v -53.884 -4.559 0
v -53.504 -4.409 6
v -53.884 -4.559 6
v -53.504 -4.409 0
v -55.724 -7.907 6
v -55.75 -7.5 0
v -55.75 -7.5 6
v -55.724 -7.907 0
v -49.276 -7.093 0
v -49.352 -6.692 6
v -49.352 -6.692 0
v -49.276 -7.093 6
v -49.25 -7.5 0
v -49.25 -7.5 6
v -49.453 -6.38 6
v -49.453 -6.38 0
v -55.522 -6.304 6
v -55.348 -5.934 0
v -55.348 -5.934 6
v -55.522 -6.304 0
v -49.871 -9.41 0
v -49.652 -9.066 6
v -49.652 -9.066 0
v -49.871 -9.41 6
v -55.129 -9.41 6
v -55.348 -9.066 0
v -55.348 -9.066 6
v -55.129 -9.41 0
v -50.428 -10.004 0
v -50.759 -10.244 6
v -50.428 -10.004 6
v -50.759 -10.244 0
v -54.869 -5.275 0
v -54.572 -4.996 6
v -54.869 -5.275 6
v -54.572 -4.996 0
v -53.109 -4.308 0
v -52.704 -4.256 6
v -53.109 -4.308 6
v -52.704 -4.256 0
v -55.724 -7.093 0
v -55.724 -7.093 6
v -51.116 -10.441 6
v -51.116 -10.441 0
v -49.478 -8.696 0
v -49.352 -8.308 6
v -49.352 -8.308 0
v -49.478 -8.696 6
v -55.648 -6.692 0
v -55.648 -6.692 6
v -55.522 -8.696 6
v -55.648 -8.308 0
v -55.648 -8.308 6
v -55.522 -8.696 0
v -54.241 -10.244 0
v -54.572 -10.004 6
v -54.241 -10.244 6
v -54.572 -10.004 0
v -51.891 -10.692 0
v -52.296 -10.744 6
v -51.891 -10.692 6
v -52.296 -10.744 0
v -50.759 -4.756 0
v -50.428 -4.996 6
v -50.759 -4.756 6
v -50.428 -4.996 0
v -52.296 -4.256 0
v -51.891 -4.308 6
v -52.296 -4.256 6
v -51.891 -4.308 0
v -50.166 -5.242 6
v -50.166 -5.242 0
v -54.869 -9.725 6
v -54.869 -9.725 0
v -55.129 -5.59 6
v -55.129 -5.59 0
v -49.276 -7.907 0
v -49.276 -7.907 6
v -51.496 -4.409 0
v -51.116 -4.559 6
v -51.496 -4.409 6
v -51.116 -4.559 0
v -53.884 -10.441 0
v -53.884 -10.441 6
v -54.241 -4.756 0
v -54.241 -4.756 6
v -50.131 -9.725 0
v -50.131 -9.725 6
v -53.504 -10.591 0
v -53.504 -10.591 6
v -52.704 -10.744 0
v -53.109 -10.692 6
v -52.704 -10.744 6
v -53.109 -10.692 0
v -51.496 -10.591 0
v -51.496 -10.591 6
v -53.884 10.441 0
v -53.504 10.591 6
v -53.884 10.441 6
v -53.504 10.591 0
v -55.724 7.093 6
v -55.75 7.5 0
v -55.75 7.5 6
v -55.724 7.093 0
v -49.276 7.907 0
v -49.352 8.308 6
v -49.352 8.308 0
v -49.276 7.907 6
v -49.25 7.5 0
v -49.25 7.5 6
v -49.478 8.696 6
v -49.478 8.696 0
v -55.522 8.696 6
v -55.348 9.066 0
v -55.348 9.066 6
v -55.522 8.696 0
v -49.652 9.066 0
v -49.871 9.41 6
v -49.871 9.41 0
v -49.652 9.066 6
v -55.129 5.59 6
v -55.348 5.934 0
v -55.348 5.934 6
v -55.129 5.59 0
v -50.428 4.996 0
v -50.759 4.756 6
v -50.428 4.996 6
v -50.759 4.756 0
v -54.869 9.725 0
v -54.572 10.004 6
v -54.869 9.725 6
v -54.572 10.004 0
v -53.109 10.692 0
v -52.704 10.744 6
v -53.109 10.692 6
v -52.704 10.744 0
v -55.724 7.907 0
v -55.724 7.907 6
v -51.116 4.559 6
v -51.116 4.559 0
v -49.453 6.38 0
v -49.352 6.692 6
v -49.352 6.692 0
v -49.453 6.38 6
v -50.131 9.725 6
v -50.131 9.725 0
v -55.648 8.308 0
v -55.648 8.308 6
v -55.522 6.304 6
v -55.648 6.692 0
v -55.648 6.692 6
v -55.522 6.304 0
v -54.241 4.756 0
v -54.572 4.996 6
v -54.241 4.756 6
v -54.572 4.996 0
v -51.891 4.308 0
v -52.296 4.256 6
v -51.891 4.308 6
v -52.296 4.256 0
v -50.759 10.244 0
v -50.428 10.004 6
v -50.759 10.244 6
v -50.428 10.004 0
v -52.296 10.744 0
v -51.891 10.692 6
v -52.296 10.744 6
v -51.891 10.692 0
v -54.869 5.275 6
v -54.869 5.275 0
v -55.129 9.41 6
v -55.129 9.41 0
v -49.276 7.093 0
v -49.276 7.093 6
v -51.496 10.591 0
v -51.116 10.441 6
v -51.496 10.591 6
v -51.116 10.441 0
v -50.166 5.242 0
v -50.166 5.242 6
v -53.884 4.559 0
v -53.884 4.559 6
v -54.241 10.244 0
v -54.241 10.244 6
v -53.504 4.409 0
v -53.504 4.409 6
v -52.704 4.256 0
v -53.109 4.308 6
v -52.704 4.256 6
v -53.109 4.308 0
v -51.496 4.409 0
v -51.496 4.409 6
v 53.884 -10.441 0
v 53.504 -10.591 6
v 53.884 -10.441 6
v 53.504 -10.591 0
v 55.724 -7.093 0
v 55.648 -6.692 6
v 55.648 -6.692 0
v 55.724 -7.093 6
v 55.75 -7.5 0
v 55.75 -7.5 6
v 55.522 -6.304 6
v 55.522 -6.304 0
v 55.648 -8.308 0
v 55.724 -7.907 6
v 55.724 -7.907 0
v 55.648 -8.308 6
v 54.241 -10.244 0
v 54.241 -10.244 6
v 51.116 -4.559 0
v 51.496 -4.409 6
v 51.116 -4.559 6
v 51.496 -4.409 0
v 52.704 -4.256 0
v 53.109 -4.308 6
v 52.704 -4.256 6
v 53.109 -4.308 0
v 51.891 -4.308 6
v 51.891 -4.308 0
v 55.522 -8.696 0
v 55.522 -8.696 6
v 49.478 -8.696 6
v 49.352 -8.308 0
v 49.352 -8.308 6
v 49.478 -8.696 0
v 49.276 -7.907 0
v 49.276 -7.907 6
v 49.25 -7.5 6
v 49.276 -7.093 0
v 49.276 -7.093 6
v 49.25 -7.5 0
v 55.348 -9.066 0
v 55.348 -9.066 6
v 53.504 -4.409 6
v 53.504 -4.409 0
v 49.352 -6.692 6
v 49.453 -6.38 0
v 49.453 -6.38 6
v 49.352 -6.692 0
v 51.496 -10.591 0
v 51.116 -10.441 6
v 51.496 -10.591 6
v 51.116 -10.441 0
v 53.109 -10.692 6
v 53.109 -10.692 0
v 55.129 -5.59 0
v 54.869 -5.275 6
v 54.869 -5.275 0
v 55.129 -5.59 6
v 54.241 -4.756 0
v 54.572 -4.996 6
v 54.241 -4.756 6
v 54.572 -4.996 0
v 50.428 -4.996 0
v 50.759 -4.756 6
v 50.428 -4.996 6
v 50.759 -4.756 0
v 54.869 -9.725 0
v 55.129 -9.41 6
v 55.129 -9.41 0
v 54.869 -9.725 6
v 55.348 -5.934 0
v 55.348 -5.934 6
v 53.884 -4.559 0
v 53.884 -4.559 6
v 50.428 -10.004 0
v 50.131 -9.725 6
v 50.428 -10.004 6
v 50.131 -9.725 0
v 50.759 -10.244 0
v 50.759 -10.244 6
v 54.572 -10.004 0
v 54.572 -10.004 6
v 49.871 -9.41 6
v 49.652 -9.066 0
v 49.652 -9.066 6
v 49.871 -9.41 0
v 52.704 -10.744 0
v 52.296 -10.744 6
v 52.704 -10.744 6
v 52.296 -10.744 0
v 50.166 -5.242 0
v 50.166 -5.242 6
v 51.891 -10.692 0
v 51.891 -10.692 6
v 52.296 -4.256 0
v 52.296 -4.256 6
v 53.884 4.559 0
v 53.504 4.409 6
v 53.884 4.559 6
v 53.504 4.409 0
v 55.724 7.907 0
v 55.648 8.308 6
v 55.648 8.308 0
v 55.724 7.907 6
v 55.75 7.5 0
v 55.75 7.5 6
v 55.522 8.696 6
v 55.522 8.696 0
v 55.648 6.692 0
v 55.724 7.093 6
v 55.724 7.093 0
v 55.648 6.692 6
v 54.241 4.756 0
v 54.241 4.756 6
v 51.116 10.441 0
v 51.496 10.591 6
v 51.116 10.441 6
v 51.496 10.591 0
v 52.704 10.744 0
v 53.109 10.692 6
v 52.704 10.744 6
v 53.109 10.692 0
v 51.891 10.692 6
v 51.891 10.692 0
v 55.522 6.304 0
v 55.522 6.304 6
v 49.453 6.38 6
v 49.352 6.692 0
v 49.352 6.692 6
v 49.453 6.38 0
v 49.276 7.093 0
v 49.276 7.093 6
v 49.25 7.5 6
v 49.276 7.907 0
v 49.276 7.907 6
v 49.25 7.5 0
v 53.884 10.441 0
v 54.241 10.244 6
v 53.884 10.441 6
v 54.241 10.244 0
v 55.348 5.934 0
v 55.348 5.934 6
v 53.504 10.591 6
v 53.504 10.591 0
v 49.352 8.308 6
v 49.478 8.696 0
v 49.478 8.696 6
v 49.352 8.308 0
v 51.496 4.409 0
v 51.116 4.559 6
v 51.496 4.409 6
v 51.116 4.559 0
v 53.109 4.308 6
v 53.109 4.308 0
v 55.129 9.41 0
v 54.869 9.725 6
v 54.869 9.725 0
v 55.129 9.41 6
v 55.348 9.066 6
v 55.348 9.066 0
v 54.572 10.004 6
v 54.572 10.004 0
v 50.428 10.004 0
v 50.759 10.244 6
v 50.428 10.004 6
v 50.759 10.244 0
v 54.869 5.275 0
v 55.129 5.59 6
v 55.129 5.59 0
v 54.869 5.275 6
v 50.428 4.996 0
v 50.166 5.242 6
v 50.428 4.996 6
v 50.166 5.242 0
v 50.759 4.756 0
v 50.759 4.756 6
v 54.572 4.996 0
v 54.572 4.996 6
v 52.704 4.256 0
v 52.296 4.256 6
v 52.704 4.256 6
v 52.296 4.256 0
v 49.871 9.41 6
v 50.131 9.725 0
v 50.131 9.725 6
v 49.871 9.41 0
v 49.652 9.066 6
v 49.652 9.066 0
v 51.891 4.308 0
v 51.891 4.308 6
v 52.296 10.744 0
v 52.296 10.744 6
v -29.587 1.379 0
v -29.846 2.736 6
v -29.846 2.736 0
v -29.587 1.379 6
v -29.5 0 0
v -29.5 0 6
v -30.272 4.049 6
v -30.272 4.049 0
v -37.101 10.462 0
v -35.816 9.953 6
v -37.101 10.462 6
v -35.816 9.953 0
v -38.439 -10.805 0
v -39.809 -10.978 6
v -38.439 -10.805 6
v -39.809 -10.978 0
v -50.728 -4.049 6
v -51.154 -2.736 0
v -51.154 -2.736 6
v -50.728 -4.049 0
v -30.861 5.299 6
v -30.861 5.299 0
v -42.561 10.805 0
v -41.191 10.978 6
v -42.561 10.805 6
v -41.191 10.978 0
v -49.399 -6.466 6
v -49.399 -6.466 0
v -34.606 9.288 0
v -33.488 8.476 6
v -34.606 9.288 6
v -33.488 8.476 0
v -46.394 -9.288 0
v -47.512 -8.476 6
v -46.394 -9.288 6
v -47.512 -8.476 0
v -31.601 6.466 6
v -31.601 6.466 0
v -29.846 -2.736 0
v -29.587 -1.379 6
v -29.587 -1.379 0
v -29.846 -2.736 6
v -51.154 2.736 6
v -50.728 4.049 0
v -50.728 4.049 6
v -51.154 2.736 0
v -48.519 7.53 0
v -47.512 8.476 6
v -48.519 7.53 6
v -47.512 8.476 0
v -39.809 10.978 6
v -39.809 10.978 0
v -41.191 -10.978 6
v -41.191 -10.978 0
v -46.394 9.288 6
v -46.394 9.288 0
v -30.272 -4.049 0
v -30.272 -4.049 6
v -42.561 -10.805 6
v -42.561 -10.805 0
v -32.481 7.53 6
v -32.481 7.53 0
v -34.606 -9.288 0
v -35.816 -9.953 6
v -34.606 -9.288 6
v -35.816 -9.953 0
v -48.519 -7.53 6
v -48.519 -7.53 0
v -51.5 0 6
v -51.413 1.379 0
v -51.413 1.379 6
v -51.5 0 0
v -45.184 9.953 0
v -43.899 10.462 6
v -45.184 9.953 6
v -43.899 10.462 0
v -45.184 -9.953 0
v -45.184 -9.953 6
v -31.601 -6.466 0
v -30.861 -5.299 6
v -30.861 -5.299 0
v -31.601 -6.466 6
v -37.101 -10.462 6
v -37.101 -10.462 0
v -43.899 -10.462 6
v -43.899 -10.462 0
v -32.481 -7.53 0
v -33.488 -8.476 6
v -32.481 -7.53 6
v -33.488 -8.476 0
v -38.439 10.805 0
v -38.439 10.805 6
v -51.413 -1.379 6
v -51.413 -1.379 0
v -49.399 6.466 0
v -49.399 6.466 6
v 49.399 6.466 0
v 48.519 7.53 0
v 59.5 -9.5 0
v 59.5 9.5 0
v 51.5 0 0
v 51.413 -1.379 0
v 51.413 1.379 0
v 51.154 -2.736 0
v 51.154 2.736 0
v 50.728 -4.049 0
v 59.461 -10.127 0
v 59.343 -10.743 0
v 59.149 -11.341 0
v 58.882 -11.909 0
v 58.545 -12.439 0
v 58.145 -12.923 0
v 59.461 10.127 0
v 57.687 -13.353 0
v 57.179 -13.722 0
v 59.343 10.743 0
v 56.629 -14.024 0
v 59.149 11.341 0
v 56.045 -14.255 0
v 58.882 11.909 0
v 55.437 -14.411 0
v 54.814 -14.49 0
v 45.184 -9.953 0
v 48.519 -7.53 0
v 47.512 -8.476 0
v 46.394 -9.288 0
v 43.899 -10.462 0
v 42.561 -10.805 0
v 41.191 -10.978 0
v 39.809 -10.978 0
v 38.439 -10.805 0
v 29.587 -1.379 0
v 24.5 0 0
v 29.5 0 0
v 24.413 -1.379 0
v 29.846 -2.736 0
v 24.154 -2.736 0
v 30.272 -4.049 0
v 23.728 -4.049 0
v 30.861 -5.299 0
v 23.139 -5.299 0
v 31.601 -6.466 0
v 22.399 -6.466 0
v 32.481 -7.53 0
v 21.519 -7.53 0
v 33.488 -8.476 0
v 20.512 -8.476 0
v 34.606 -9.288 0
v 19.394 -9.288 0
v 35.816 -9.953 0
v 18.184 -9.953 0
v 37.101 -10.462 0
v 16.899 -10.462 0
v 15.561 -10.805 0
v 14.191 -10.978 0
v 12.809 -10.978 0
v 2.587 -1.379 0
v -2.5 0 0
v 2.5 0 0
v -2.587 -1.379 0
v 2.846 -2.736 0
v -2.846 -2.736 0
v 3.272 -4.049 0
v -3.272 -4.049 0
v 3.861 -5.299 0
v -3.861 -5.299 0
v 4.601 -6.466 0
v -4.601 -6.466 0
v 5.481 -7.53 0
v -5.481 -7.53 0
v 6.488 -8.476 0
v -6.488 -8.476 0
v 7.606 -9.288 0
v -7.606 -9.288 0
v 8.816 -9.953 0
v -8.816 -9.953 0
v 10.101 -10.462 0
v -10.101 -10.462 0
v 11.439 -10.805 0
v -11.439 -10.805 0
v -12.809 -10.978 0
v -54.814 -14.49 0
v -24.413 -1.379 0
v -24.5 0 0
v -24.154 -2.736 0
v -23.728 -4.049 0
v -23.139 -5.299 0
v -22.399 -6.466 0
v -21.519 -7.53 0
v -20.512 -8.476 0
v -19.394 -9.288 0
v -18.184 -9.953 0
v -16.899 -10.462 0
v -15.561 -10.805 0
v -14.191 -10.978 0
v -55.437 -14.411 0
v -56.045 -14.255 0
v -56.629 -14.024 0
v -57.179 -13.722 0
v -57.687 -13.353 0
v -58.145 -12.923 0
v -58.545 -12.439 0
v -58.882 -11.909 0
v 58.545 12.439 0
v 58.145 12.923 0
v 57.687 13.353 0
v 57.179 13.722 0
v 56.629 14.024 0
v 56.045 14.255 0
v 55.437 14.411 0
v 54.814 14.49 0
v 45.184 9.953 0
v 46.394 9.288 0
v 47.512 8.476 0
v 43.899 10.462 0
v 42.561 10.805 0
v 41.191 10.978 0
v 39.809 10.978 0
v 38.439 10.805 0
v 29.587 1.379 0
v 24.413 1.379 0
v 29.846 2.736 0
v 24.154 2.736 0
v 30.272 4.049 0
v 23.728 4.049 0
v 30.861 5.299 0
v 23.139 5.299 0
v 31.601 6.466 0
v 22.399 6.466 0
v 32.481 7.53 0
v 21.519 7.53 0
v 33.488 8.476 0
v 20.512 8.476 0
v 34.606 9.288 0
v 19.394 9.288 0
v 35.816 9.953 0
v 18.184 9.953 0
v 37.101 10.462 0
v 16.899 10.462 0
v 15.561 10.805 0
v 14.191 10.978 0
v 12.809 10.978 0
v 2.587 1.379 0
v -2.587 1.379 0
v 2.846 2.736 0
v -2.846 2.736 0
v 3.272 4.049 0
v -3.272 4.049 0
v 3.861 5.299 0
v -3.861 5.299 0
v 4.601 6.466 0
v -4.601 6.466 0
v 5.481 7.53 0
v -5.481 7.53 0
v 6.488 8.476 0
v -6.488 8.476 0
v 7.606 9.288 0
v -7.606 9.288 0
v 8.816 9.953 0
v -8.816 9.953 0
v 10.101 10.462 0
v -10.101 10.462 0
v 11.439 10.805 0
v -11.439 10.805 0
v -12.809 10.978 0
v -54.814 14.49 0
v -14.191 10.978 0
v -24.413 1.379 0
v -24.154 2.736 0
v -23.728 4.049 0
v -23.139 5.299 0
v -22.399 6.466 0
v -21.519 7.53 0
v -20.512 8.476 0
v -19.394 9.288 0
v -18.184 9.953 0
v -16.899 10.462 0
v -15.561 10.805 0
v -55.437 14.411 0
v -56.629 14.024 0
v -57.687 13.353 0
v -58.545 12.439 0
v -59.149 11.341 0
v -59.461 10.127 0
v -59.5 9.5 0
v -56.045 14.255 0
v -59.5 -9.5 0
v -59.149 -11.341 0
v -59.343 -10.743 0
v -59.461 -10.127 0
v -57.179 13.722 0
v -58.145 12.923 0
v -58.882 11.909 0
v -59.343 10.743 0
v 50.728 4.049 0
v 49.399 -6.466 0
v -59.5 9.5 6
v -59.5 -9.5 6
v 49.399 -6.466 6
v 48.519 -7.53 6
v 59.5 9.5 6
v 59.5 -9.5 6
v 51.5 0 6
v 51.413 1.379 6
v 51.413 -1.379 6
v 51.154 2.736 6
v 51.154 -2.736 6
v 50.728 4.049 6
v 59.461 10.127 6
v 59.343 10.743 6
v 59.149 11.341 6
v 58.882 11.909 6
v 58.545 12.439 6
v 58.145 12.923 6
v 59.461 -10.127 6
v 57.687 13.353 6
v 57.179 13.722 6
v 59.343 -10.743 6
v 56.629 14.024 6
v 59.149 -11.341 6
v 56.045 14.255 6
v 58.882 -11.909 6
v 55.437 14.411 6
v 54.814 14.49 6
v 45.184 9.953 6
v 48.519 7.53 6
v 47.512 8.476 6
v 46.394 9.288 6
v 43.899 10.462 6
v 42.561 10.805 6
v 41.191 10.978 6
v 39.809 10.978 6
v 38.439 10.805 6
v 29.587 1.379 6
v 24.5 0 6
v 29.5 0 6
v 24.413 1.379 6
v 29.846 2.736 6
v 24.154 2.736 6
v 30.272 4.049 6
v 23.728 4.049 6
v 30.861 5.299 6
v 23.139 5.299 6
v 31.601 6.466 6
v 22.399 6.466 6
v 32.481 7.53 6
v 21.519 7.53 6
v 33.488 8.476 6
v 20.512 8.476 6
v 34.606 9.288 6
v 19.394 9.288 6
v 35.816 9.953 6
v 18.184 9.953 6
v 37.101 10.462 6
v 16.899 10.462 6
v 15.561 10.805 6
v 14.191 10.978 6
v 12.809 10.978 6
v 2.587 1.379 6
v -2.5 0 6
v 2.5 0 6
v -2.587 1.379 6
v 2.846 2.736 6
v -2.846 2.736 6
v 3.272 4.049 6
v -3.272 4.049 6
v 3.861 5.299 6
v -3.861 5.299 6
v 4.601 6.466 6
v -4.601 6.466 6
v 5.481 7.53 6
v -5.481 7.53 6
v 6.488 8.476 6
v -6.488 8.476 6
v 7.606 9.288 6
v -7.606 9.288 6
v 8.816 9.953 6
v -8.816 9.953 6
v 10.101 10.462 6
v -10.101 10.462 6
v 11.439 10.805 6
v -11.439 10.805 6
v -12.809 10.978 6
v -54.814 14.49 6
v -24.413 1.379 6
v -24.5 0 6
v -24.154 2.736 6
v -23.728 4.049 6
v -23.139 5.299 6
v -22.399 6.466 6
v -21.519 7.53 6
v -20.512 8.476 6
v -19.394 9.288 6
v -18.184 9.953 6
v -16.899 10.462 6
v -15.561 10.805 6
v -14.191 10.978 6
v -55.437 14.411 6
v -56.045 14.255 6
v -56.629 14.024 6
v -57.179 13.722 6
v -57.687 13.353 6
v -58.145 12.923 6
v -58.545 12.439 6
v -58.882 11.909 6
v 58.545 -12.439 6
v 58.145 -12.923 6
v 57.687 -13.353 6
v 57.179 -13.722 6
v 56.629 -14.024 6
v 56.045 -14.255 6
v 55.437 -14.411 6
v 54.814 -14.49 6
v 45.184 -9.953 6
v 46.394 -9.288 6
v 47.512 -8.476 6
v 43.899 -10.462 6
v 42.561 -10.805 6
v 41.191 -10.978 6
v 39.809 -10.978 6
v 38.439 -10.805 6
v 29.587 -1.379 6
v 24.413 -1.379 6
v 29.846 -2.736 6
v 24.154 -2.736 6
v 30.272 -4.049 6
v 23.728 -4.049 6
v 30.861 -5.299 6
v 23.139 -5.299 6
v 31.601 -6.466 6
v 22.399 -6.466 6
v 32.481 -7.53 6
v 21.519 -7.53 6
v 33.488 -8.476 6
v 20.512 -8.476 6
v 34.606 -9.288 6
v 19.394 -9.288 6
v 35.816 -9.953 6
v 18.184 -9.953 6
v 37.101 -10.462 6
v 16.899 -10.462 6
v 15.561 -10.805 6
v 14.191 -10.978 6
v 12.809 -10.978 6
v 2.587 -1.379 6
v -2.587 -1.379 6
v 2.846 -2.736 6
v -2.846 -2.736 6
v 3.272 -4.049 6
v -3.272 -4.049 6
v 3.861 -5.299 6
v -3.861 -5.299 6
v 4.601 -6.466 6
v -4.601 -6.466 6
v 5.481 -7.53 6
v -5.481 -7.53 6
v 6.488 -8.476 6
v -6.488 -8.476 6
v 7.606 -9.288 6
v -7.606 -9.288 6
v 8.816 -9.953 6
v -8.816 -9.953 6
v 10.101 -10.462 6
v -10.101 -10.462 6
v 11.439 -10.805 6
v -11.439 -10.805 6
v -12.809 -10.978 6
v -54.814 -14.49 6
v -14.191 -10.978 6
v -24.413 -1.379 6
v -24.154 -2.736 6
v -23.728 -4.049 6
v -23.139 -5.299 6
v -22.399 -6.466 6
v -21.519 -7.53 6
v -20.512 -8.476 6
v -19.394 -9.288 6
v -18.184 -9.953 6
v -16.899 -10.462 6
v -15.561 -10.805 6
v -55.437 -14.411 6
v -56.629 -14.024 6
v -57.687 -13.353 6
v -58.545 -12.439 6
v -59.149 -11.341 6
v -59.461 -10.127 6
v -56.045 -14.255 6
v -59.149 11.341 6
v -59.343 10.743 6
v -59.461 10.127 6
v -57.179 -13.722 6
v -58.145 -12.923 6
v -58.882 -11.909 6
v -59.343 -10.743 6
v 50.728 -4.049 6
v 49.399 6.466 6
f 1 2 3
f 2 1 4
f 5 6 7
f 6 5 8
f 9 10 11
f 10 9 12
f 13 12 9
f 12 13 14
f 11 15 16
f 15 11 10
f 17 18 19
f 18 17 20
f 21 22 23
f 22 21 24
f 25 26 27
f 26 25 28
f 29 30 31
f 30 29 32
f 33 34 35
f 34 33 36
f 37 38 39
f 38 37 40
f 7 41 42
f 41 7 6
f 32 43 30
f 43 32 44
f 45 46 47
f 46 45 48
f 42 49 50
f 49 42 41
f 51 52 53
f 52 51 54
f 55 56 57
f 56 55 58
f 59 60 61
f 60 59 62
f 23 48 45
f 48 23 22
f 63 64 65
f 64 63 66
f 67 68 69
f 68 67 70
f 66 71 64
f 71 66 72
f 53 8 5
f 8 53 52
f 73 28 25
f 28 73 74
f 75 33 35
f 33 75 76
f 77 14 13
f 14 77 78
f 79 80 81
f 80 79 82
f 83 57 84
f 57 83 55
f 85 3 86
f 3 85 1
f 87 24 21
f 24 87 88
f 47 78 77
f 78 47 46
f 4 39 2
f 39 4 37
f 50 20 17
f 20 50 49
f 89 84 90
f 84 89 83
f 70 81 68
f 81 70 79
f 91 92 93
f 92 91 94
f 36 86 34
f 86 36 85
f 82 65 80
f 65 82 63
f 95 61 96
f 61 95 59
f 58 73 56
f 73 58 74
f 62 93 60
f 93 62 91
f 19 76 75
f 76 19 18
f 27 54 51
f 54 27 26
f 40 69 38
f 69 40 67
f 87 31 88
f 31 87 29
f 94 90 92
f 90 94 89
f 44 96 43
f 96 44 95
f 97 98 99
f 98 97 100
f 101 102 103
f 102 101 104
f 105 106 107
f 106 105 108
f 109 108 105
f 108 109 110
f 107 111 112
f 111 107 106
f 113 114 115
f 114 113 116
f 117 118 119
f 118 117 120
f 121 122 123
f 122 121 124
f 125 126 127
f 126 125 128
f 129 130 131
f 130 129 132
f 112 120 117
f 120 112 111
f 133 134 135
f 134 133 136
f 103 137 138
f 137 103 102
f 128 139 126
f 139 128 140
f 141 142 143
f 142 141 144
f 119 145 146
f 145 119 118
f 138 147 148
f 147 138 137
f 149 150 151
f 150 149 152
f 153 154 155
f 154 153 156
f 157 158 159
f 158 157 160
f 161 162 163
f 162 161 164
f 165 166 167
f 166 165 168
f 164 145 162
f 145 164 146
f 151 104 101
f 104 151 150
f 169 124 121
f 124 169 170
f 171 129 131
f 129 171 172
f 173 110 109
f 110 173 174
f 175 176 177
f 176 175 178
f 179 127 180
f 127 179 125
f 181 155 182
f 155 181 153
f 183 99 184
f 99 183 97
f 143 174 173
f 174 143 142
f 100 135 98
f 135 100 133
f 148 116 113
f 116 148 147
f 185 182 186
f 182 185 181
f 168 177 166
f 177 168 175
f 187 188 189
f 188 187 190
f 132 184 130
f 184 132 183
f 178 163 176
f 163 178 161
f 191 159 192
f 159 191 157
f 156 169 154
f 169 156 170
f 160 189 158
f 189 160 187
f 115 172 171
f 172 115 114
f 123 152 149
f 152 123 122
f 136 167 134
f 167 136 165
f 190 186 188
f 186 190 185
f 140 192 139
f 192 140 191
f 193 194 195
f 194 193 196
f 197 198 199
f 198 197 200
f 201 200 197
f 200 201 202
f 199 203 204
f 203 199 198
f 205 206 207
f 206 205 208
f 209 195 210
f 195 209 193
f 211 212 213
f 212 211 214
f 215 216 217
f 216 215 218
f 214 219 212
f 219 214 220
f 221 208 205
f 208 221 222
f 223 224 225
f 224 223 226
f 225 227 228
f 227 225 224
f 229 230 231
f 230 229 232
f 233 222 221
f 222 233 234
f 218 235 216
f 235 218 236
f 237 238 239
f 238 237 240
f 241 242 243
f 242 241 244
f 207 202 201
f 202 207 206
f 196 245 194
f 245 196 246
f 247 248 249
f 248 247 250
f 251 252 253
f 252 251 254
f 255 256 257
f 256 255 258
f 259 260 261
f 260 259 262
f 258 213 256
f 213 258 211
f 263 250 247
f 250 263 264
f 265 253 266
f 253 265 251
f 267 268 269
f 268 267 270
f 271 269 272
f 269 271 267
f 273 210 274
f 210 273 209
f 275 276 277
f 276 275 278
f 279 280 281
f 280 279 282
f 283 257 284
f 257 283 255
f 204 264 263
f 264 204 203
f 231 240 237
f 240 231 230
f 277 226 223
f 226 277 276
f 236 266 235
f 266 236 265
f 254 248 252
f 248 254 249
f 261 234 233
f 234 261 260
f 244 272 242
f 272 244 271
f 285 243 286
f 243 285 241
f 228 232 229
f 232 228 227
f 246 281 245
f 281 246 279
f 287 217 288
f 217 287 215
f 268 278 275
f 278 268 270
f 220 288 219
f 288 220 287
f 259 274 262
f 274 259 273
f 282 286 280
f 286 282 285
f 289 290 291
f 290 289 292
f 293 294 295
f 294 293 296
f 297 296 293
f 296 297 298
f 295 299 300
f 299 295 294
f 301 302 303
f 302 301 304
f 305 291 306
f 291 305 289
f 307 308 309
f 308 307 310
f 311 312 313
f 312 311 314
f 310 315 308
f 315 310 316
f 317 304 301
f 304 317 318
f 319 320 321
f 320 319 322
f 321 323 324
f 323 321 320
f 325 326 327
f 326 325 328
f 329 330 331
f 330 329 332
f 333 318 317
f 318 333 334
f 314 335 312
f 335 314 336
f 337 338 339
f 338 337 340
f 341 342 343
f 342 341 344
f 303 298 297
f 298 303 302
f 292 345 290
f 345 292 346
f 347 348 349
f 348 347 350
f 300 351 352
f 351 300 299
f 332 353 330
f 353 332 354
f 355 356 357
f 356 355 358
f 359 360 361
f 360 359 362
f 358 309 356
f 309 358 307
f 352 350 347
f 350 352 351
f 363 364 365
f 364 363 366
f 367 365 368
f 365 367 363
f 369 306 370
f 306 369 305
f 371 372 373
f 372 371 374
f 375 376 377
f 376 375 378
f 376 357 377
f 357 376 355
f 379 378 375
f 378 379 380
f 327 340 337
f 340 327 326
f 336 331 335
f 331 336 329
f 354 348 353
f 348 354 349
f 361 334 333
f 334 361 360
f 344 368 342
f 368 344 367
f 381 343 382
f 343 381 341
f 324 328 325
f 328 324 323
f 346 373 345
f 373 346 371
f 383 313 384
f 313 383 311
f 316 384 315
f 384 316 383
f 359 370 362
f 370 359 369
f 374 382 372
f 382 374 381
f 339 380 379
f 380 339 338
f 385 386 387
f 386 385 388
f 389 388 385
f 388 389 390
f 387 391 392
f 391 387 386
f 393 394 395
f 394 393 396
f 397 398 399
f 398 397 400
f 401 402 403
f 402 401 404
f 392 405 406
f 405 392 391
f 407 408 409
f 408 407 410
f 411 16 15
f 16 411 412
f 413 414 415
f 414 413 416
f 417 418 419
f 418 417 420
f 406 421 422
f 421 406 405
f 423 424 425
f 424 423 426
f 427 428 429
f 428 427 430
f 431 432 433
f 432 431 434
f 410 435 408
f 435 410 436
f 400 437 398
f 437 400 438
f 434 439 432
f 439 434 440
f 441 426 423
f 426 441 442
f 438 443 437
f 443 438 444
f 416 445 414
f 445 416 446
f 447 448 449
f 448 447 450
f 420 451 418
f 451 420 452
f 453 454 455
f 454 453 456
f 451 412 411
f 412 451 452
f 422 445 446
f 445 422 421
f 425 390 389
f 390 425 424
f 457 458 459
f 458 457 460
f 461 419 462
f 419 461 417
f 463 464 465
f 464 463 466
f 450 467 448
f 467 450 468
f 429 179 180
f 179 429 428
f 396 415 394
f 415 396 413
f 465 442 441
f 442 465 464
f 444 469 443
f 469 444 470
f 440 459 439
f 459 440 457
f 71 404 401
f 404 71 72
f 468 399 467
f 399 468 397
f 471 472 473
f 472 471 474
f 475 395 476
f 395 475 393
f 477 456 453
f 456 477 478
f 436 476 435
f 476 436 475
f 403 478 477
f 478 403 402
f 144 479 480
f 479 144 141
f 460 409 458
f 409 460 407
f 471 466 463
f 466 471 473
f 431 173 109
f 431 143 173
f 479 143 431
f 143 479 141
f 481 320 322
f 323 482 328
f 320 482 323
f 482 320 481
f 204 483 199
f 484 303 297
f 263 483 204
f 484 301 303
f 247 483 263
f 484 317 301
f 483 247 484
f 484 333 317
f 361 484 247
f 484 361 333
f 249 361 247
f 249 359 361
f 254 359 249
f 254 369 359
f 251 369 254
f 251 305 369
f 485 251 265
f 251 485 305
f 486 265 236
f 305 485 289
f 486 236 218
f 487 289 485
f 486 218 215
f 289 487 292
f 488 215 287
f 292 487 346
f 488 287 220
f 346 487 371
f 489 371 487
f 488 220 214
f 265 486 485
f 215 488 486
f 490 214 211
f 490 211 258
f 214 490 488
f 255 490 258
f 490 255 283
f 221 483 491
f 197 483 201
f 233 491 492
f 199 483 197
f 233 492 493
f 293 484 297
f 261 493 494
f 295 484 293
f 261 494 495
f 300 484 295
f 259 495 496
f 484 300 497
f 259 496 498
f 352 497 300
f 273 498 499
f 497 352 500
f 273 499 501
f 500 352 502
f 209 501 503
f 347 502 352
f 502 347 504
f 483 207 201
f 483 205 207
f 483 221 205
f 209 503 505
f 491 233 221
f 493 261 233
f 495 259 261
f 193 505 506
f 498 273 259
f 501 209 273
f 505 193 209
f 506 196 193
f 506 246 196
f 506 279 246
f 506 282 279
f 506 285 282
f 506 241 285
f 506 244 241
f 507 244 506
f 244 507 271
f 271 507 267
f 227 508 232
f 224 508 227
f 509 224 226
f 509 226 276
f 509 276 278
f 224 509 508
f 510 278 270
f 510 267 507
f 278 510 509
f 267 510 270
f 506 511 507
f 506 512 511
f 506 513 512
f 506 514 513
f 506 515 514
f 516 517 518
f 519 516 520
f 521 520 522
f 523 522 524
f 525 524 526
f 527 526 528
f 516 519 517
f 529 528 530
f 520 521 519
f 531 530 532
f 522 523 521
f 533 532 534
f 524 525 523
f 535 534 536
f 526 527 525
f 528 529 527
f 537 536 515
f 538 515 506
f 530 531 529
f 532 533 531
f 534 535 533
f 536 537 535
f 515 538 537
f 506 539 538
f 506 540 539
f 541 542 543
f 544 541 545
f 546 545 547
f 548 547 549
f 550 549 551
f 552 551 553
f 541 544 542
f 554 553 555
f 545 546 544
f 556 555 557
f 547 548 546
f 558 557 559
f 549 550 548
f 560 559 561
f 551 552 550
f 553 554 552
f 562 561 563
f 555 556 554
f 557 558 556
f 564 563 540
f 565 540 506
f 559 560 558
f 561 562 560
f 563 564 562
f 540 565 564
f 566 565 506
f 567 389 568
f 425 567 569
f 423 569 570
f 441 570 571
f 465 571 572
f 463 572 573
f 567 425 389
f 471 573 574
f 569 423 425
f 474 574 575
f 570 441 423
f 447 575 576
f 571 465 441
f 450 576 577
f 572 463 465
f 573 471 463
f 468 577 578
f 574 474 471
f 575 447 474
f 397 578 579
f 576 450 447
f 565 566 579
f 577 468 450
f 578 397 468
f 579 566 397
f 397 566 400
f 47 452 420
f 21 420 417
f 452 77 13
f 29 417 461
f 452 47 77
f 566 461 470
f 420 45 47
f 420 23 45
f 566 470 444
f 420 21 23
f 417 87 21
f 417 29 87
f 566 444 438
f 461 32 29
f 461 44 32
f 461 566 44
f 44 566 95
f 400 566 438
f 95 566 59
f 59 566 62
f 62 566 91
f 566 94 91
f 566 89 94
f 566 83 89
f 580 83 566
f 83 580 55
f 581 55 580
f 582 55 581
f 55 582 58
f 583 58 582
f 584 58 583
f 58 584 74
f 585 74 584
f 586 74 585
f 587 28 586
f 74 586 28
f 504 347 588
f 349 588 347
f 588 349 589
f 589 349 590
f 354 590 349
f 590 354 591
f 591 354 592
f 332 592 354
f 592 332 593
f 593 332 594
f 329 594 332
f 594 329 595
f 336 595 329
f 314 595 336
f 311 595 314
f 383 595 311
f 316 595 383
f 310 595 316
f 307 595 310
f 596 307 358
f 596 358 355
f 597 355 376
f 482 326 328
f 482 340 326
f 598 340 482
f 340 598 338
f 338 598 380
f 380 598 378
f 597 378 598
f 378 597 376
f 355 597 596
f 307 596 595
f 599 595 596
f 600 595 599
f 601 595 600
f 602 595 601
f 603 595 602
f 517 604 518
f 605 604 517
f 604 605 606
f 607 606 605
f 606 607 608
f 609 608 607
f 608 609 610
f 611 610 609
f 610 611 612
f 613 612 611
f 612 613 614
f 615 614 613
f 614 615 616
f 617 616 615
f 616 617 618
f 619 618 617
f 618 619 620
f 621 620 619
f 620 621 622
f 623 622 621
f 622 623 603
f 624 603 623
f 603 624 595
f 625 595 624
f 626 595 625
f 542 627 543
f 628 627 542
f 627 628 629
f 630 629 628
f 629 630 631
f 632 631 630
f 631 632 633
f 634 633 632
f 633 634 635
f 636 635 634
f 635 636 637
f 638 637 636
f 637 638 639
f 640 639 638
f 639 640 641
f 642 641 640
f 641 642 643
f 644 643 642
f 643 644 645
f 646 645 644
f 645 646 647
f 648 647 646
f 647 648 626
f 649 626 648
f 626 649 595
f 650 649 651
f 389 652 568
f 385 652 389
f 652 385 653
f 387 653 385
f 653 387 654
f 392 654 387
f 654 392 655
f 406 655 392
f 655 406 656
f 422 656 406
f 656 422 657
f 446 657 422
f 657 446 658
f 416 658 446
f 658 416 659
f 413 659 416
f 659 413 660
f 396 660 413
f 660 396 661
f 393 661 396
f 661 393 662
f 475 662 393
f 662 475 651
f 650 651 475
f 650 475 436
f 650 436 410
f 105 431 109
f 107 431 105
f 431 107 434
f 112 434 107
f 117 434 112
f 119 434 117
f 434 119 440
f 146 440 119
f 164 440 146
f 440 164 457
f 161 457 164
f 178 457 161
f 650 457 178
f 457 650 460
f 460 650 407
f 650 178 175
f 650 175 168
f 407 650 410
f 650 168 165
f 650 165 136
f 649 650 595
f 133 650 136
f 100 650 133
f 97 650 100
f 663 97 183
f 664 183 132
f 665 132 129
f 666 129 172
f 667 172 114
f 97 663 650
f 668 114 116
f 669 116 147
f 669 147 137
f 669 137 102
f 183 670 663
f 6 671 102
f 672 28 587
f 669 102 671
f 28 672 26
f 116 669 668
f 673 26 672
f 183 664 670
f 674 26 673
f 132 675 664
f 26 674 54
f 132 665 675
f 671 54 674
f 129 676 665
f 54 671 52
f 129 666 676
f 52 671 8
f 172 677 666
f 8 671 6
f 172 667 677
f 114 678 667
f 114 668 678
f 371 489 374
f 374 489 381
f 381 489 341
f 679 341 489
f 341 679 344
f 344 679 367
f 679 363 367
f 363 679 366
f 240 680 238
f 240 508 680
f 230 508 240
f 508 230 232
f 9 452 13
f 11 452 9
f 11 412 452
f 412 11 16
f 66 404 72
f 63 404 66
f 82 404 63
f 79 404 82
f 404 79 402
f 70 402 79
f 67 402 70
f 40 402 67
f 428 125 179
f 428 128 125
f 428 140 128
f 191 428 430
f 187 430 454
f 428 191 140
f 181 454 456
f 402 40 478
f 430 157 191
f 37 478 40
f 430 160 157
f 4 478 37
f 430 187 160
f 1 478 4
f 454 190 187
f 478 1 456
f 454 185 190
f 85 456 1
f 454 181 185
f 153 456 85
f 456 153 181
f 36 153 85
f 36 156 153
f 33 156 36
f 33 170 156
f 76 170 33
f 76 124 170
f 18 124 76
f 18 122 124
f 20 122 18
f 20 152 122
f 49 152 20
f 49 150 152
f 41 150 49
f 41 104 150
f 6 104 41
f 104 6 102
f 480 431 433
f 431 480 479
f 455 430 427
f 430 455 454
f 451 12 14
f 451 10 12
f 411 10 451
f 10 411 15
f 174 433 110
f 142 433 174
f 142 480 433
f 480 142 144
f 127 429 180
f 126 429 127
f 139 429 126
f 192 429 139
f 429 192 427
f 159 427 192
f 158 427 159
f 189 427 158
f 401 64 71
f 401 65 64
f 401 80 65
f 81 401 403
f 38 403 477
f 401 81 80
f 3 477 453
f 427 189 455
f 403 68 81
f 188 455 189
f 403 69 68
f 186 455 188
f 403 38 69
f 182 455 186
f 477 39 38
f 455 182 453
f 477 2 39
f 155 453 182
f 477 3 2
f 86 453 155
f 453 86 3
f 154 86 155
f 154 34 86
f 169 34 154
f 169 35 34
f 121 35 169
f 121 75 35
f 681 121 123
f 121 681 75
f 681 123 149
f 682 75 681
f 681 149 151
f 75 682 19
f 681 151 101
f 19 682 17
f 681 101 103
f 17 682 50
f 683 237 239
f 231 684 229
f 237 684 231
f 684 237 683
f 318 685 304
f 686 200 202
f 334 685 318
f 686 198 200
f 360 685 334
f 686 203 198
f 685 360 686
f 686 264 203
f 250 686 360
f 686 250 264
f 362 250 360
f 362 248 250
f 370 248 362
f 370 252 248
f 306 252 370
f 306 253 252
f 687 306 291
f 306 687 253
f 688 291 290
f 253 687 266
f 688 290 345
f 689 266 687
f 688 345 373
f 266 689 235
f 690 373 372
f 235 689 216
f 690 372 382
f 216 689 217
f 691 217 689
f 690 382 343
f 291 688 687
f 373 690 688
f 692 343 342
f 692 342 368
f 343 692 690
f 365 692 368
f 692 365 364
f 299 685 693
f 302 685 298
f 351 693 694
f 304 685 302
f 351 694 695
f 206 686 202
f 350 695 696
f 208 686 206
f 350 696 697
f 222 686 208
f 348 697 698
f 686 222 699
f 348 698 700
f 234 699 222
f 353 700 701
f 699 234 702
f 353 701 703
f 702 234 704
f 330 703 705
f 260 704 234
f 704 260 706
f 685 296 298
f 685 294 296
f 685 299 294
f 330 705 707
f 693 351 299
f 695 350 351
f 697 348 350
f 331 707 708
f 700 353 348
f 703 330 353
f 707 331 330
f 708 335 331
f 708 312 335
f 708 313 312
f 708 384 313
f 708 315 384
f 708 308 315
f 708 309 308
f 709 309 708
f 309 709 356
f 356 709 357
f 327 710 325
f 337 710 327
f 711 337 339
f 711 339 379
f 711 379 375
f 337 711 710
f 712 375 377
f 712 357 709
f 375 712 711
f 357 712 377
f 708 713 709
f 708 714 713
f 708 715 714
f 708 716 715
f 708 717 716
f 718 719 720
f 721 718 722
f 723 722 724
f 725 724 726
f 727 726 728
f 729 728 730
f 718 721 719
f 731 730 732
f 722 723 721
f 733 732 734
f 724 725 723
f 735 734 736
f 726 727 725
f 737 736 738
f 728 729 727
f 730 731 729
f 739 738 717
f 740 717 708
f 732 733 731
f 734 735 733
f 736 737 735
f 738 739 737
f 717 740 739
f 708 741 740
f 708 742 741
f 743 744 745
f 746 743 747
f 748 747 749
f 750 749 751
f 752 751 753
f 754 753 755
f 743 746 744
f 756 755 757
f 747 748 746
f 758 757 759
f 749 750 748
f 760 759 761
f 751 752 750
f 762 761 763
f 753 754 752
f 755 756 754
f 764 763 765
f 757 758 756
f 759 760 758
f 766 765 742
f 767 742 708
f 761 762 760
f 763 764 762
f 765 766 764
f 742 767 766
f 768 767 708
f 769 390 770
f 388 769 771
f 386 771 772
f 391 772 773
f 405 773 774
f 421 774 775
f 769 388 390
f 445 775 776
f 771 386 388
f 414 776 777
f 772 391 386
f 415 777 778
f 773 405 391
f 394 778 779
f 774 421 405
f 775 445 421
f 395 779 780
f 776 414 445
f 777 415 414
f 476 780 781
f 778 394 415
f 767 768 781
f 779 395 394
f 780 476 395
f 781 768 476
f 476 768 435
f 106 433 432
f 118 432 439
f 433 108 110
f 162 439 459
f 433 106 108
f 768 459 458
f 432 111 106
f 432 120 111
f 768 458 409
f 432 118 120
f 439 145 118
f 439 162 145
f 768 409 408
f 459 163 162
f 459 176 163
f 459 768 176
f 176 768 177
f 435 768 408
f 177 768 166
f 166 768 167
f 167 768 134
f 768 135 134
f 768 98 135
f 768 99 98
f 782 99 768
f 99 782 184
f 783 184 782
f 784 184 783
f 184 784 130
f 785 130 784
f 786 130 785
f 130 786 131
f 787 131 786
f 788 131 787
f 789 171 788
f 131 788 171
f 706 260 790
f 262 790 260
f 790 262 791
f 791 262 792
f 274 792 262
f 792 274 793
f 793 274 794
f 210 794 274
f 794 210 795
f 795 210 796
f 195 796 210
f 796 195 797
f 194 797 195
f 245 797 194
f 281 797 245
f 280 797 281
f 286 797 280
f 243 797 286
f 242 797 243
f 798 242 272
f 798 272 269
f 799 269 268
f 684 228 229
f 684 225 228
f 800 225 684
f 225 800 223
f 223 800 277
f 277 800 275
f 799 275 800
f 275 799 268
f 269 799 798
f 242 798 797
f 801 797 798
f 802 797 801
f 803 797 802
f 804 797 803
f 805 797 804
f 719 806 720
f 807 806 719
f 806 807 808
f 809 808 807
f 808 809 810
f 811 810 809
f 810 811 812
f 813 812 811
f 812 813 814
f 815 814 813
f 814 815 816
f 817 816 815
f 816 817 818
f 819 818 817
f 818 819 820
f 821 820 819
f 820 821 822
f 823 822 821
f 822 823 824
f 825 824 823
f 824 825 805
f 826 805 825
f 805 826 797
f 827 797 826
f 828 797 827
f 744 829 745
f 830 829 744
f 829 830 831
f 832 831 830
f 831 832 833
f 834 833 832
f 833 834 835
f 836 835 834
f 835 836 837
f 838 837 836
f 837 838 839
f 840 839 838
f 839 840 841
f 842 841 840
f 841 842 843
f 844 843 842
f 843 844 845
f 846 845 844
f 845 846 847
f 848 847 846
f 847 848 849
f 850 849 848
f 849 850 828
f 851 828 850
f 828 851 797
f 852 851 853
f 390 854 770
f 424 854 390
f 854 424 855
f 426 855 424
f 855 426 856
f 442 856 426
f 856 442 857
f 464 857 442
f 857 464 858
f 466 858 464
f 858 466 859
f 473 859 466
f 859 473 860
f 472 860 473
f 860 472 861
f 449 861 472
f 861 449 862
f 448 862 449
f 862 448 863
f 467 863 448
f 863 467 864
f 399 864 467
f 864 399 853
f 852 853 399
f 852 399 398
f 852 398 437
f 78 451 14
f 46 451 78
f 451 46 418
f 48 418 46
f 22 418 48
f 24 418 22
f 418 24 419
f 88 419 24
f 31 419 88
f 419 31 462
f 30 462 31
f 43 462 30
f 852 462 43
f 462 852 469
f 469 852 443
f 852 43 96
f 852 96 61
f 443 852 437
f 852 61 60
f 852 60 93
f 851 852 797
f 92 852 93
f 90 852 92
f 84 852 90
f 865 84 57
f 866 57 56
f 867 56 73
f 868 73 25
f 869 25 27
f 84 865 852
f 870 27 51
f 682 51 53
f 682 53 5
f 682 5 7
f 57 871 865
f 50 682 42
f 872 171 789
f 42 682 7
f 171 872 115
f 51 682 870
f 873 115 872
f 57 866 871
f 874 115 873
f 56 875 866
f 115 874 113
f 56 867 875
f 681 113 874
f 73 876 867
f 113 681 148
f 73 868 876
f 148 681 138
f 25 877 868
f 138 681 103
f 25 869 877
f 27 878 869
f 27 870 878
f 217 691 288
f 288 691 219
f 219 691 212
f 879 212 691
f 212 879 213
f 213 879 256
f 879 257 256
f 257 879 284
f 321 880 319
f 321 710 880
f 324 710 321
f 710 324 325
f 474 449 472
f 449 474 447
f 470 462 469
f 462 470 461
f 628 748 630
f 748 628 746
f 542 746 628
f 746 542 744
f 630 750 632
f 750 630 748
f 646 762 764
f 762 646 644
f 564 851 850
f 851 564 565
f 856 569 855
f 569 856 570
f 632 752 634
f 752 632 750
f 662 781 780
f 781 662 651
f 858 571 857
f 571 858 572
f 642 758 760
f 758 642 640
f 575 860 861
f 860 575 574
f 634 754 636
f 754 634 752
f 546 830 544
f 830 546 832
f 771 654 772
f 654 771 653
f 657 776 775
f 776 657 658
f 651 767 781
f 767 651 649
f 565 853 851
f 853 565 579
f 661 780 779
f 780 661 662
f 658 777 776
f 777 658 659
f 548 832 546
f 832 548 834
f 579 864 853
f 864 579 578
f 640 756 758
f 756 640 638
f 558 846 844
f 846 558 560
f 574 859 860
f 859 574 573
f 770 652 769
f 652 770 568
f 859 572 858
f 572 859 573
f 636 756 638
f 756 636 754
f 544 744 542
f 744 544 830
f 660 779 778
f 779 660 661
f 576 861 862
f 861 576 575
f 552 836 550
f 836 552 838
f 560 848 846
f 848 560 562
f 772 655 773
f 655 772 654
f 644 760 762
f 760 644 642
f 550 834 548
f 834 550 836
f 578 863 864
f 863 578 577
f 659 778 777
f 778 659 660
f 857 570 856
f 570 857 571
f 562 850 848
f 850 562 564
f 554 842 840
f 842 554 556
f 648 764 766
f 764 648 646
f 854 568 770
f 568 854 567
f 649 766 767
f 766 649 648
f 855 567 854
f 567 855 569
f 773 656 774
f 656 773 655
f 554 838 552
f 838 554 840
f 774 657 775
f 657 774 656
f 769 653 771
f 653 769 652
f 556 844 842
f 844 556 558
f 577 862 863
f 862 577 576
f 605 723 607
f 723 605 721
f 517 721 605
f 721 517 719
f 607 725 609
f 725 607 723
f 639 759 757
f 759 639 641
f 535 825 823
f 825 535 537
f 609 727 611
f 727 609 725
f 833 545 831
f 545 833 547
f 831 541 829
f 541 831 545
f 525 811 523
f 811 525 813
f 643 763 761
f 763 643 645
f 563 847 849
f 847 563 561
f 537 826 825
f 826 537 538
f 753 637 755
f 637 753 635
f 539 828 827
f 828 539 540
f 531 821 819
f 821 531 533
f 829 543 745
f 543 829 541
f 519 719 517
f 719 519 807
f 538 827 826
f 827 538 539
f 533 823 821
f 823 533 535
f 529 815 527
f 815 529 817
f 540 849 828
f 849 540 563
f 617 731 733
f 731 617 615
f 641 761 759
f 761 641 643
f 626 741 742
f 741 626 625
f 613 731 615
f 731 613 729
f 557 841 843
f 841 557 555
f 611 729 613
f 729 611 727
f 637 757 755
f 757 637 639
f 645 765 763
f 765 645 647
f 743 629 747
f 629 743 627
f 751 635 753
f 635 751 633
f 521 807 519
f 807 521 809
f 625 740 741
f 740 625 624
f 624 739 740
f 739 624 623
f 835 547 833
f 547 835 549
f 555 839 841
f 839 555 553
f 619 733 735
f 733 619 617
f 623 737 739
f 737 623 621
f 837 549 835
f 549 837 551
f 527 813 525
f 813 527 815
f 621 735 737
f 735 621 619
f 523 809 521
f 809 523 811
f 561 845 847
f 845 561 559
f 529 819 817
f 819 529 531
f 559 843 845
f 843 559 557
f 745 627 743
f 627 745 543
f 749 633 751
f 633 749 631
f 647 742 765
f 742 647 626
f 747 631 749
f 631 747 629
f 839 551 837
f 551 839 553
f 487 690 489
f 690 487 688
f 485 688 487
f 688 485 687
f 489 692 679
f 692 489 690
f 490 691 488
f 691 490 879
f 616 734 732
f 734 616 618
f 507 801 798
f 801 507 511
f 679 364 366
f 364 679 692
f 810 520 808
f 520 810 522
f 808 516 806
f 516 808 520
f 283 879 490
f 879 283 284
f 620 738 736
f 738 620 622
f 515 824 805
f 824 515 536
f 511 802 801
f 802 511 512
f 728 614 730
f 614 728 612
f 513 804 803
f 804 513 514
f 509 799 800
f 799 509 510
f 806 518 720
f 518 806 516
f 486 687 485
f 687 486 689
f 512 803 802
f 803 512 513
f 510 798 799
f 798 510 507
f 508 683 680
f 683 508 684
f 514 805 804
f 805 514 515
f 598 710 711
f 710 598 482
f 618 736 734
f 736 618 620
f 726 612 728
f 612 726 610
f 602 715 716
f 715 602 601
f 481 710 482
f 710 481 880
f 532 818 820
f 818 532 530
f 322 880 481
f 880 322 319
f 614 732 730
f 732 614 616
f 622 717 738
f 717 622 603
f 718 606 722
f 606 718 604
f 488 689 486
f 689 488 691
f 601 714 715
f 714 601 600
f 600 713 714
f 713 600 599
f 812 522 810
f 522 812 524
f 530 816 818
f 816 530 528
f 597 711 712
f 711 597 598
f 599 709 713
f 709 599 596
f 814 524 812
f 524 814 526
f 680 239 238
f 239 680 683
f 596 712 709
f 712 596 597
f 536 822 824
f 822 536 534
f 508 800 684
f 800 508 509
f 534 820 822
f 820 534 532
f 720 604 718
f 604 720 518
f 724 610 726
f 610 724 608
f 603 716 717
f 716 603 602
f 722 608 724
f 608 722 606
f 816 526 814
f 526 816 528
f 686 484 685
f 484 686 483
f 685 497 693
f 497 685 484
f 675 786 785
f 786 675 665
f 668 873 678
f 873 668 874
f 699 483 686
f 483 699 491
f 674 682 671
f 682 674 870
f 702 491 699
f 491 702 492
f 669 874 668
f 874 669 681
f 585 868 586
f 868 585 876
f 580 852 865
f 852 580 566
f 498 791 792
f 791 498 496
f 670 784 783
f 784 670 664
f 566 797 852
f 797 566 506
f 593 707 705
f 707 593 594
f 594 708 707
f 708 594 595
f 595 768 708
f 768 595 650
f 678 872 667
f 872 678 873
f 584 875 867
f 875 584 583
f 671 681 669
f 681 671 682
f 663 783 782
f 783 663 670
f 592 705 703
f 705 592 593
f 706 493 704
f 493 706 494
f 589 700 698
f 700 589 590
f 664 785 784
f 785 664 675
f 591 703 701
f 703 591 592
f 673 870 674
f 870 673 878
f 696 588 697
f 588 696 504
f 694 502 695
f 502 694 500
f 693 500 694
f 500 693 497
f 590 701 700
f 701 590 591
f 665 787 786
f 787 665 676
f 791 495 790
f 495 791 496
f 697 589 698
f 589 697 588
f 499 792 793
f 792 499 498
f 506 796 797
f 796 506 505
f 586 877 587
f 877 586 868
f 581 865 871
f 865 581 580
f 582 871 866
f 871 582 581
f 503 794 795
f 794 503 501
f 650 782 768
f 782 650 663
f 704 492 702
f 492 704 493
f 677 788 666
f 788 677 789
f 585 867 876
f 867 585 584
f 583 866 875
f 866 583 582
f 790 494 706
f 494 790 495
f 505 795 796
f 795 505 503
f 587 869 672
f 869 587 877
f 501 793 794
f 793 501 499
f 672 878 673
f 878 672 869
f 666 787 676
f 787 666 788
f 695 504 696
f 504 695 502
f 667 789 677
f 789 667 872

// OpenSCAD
$fn = 50;


difference() {
	union() {
		hull() {
			translate(v = [-54.5000000000, 9.5000000000, 0]) {
				cylinder(h = 6, r = 5);
			}
			translate(v = [54.5000000000, 9.5000000000, 0]) {
				cylinder(h = 6, r = 5);
			}
			translate(v = [-54.5000000000, -9.5000000000, 0]) {
				cylinder(h = 6, r = 5);
			}
			translate(v = [54.5000000000, -9.5000000000, 0]) {
				cylinder(h = 6, r = 5);
			}
		}
	}
	union() {
		#translate(v = [-52.5000000000, -7.5000000000, -100.0000000000]) {
			cylinder(h = 200, r = 3.2500000000);
		}
		#translate(v = [-52.5000000000, 7.5000000000, -100.0000000000]) {
			cylinder(h = 200, r = 3.2500000000);
		}
		#translate(v = [52.5000000000, -7.5000000000, -100.0000000000]) {
			cylinder(h = 200, r = 3.2500000000);
		}
		#translate(v = [52.5000000000, 7.5000000000, -100.0000000000]) {
			cylinder(h = 200, r = 3.2500000000);
		}
		#translate(v = [-40.5000000000, 0, 0]) {
			cylinder(h = 6, r = 11.0000000000);
		}
		#translate(v = [-13.5000000000, 0, 0]) {
			cylinder(h = 6, r = 11.0000000000);
		}
		#translate(v = [13.5000000000, 0, 0]) {
			cylinder(h = 6, r = 11.0000000000);
		}
		#translate(v = [40.5000000000, 0, 0]) {
			cylinder(h = 6, r = 11.0000000000);
		}
	}
}
